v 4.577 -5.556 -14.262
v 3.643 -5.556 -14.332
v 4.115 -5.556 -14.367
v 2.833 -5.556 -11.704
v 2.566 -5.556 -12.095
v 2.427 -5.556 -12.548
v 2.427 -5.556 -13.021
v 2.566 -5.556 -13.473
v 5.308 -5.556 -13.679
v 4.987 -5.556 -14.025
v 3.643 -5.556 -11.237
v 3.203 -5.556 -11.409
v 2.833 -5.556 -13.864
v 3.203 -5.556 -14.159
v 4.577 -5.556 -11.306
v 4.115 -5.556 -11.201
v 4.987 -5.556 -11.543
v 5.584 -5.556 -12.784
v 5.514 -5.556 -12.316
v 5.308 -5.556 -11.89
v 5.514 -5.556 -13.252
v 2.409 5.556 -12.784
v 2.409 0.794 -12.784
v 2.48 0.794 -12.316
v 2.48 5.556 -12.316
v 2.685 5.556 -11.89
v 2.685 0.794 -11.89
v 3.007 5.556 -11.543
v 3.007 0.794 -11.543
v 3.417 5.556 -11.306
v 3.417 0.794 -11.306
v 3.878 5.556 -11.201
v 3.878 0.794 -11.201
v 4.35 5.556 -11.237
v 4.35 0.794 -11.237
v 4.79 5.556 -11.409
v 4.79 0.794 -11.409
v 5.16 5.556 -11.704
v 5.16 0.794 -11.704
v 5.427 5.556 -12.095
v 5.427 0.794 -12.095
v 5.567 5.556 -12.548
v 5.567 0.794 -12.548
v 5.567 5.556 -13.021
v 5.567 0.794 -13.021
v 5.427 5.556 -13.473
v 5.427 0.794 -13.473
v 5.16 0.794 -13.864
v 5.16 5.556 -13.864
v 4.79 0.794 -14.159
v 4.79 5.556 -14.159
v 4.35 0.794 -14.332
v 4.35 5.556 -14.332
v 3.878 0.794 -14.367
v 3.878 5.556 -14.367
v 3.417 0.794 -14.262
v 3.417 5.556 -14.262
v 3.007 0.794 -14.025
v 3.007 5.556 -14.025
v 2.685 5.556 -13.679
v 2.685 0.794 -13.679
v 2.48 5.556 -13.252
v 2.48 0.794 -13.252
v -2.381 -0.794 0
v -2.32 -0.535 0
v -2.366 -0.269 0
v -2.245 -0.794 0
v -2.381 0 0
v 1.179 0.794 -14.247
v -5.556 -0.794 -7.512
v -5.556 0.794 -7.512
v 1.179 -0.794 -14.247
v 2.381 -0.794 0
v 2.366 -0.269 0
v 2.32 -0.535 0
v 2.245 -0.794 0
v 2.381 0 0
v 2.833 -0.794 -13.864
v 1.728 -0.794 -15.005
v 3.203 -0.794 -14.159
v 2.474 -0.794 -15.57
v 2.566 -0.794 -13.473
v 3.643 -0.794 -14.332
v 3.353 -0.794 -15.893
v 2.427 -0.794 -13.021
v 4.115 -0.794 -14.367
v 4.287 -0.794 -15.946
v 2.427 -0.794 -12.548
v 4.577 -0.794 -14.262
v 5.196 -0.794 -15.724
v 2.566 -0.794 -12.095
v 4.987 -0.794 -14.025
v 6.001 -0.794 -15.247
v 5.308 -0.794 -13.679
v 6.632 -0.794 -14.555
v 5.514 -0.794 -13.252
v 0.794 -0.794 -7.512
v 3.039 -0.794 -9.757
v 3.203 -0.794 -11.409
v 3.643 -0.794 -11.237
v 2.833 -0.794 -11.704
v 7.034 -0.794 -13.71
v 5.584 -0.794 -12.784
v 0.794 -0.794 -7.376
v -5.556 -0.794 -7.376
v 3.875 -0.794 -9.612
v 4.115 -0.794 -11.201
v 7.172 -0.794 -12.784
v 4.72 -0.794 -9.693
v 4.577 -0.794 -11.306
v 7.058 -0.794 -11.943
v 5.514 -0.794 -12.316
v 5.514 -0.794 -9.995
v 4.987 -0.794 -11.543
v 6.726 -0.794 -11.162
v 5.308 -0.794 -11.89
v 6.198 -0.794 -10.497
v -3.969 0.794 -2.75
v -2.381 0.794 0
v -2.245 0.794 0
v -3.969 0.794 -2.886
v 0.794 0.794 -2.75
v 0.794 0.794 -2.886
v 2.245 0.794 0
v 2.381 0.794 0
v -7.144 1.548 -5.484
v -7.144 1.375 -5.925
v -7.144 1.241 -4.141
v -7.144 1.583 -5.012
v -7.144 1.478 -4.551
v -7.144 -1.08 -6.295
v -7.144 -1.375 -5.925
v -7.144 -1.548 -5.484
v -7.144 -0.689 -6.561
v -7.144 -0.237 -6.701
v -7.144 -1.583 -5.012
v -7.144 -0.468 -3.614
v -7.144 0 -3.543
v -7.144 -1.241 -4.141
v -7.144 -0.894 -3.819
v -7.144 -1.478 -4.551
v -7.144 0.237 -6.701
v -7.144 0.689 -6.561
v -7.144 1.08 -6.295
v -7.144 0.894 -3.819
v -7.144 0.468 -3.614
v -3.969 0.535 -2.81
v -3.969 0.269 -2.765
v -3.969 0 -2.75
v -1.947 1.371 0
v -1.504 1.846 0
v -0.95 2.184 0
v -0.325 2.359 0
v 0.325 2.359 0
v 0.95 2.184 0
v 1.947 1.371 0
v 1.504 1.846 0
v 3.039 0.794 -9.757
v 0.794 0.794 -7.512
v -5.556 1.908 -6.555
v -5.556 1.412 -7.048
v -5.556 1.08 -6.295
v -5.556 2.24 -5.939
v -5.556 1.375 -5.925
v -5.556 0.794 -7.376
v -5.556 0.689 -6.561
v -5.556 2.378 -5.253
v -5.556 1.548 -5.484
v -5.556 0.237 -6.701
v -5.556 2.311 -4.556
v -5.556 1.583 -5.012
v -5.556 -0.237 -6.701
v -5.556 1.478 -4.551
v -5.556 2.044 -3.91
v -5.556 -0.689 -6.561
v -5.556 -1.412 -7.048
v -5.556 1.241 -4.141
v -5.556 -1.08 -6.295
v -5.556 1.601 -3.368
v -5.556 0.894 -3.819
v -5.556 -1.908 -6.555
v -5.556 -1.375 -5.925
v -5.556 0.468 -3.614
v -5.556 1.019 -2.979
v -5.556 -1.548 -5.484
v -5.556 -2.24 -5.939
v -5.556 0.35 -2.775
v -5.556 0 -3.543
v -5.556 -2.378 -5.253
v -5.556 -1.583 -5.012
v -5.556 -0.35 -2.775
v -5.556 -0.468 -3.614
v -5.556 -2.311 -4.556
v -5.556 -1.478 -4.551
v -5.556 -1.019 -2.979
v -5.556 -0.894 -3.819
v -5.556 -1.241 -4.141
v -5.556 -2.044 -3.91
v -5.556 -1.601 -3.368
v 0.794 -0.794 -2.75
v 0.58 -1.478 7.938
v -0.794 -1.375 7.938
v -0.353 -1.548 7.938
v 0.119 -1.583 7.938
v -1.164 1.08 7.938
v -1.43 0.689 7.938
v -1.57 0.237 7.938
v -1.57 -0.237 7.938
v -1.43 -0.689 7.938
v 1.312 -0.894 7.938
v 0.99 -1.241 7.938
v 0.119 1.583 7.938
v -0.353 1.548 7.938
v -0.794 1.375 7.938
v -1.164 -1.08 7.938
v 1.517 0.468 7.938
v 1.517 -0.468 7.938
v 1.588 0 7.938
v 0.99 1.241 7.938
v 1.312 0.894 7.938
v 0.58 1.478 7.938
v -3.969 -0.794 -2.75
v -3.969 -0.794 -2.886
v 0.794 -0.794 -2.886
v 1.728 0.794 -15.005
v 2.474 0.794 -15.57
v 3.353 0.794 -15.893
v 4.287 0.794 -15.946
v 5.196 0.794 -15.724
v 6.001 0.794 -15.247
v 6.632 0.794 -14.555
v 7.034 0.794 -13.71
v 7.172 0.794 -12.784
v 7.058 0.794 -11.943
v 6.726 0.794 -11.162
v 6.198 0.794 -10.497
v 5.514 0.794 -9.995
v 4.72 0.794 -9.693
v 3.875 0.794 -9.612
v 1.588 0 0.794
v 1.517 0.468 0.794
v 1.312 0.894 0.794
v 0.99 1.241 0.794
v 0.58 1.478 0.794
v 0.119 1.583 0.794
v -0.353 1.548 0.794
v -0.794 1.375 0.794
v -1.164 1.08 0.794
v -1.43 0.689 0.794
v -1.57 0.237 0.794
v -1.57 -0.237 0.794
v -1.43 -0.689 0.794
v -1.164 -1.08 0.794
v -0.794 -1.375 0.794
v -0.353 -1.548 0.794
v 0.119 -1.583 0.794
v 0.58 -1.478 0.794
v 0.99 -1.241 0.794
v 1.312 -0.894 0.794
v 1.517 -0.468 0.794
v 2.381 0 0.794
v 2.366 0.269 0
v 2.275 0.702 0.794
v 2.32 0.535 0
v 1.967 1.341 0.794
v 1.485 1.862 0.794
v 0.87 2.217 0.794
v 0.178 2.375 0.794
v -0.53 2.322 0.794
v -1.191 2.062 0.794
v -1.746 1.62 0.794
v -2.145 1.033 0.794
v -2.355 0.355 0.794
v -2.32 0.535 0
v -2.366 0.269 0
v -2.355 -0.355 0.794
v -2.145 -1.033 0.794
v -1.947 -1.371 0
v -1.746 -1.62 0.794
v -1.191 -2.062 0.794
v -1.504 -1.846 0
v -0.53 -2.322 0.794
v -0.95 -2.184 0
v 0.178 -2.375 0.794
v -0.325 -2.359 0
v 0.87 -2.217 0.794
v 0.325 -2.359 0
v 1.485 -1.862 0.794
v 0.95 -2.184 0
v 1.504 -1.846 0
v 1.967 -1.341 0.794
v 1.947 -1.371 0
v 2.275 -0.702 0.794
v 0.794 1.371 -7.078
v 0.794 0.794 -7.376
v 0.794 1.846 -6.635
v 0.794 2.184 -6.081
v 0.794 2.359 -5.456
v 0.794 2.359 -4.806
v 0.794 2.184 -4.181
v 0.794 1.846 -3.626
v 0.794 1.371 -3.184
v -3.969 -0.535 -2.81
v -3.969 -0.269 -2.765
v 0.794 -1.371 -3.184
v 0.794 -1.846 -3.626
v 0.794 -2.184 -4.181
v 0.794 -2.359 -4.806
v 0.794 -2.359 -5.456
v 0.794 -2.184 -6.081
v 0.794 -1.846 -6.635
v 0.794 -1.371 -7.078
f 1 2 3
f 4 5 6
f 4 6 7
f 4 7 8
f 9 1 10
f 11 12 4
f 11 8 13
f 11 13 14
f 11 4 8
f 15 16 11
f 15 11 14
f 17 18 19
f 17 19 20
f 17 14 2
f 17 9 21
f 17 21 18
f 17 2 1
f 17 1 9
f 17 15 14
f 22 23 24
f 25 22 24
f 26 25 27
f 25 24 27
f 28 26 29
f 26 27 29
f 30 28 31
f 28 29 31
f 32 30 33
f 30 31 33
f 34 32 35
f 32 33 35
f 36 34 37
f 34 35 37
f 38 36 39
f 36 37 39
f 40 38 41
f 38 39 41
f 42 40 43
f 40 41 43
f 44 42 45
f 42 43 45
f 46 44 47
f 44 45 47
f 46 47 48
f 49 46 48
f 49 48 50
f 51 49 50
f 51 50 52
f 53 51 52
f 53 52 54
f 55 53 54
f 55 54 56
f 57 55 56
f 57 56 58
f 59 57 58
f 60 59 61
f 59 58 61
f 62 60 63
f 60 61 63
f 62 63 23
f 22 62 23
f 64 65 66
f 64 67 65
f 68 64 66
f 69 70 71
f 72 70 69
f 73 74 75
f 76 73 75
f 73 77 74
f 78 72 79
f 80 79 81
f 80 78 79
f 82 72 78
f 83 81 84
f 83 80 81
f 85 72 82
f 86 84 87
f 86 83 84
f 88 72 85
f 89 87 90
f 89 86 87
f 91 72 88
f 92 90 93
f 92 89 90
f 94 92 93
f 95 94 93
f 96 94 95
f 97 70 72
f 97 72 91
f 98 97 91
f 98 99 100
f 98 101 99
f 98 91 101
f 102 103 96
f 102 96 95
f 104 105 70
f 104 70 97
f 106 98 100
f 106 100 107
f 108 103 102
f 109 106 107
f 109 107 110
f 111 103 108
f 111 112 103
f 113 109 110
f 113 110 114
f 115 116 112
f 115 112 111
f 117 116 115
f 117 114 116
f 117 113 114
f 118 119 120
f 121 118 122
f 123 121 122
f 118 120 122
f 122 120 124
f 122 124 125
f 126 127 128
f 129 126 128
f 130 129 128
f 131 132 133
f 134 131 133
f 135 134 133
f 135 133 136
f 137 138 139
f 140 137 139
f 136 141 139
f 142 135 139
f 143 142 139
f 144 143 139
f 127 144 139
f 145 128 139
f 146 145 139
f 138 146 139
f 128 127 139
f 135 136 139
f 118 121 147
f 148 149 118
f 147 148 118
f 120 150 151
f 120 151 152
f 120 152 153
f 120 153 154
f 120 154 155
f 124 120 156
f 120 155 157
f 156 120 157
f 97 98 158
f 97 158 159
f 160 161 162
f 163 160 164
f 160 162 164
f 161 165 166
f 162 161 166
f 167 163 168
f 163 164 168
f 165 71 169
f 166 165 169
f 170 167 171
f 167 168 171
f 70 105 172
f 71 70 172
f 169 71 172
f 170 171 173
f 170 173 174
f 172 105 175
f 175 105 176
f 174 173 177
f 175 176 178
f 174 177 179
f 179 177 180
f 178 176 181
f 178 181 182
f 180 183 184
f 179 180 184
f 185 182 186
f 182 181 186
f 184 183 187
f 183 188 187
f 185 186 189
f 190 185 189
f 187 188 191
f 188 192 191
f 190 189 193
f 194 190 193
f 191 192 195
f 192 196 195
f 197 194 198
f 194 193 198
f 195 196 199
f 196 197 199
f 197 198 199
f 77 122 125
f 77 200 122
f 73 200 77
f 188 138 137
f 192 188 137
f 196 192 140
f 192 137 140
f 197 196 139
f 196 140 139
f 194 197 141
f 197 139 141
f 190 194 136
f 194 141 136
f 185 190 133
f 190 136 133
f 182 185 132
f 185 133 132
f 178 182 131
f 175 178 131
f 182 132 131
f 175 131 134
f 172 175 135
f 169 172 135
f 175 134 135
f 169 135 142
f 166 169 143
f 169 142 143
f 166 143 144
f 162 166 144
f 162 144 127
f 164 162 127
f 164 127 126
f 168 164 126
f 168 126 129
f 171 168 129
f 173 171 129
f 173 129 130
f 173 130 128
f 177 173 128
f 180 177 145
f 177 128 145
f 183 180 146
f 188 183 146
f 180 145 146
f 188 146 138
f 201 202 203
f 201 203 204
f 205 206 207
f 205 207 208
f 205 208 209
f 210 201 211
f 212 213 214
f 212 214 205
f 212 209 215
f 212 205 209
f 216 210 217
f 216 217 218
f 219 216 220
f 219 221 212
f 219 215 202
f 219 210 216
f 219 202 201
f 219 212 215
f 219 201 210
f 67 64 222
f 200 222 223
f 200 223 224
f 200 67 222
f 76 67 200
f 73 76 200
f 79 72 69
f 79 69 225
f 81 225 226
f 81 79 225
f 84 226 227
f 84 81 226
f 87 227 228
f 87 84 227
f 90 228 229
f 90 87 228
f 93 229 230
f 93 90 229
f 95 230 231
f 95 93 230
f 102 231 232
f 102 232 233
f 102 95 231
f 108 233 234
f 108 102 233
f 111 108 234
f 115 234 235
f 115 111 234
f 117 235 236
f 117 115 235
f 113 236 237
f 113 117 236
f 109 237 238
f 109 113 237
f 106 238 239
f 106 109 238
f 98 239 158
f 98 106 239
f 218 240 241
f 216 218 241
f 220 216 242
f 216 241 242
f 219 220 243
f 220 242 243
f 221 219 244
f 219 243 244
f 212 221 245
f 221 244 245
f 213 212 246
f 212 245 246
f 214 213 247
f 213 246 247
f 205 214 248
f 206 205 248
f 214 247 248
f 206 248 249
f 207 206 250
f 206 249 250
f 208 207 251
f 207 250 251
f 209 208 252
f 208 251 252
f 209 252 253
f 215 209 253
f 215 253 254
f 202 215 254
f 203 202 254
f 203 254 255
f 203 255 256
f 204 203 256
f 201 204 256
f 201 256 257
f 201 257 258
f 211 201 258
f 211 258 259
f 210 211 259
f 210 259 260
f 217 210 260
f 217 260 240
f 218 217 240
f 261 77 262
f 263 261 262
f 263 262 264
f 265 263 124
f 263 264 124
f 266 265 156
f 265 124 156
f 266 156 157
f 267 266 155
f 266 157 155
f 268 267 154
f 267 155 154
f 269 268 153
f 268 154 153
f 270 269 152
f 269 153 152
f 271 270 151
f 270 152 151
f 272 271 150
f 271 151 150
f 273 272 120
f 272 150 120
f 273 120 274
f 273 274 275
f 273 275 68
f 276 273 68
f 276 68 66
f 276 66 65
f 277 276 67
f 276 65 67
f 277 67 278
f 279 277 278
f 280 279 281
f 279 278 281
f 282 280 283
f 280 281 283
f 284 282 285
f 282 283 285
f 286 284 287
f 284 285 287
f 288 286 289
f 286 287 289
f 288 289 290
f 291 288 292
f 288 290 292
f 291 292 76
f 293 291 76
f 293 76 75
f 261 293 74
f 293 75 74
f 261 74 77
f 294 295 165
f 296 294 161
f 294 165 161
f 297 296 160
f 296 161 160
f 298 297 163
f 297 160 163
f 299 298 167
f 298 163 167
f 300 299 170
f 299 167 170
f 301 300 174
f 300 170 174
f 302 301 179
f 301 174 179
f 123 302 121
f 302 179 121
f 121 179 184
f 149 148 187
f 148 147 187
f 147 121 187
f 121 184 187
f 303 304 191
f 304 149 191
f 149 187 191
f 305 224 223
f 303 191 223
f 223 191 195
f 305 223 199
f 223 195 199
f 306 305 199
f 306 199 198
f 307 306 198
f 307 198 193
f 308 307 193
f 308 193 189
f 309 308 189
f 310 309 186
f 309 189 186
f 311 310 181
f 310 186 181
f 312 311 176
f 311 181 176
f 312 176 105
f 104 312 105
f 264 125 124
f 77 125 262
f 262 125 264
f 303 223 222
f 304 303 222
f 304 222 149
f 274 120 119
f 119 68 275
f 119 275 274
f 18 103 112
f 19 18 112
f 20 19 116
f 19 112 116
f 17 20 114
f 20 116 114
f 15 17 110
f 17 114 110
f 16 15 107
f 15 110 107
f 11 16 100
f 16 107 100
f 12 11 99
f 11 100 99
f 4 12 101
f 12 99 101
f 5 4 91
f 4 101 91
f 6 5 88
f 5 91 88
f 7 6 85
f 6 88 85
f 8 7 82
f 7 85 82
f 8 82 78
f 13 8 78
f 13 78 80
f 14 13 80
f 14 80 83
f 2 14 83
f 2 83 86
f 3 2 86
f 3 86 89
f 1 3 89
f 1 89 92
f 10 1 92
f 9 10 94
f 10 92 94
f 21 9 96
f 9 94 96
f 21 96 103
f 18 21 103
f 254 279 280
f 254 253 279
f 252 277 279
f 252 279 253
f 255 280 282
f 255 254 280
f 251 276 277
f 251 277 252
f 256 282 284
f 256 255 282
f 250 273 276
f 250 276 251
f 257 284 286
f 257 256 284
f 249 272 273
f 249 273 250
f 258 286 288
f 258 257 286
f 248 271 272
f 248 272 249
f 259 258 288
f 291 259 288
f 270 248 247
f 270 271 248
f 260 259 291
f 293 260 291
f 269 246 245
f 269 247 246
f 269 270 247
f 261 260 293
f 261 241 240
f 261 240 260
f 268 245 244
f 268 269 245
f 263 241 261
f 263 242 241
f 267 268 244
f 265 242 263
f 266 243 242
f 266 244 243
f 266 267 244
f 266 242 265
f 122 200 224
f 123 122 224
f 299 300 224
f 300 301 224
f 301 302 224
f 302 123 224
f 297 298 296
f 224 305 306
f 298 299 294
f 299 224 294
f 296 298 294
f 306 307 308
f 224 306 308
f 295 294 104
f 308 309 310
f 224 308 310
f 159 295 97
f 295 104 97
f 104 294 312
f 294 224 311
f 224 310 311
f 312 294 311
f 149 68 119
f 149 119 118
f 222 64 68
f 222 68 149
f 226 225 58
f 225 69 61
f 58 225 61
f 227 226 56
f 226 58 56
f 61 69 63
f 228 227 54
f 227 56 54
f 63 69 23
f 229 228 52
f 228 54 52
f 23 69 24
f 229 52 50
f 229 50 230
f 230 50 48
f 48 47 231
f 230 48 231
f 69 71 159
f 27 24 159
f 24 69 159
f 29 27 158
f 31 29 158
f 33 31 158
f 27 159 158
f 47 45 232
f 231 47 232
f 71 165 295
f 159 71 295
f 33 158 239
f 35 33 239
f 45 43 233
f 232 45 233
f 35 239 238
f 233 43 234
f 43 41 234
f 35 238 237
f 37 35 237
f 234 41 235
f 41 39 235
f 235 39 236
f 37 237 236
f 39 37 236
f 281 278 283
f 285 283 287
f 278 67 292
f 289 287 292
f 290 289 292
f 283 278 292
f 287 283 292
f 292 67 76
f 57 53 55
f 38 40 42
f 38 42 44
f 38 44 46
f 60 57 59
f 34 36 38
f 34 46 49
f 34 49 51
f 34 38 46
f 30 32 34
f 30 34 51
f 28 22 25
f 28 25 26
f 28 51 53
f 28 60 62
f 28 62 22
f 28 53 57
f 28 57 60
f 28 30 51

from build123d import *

# Parameters (mm, degrees)
F0_R     = 2.38125
F0_R_2   = 1.5875
F1_DEPTH = 0.79375
F2_DEPTH = 7.9375
F3_W     = 4.7625
F3_H     = 0.79375
F4_DEPTH = 0.79375
F3_W_2   = 6.35
F6_R     = 1.5875
F7_DEPTH = 4.7625
F8_R     = 1.5875
F9_DEPTH = 4.7625


with BuildPart() as f1:
    # F0 (on Top) → F1 (new body)
    with BuildSketch(Plane.XY):
        Circle(F0_R)
        Circle(F0_R_2, mode=Mode.SUBTRACT)
    extrude(amount=F1_DEPTH)

    # F0 (on Top) → F2 (join)
    with BuildSketch(Plane.XY):
        Circle(F0_R_2)
    extrude(amount=F2_DEPTH)

    # F3 (on Front) → F4 (join, symmetric)
    with BuildSketch(Plane.XZ):
        Polygon((2.38125, 0), (0, 0), (-2.38125, 0), (-3.96875, -2.749630657), (0.79375, -2.749630657), align=None)
        with Locations((-1.5875, -3.146505657)):
            Rectangle(F3_W, F3_H)
    extrude(amount=F4_DEPTH, both=True)



with BuildPart() as f4:
    # F3 (on Front) → F4, piece 2 (new body, symmetric)
    with BuildSketch(Plane.XZ):
        with Locations((-2.38125, -7.115255657)):
            Rectangle(F3_W_2, F3_H)
        with BuildLine():
            Line((3.0388140303, -9.7571946873), (0.79375, -7.512130657))
            Line((0.79375, -7.512130657), (-5.55625, -7.512130657))
            Line((-5.55625, -7.512130657), (1.1789420908, -14.2473227478))
            ThreePointArc((1.1789420908, -14.2473227478), (1.0634268399, -11.5692186432), (3.0388140303, -9.7571946873))
        make_face()
        with BuildLine():
            Line((1.1789420908, -14.2473227478), (3.0388140303, -9.7571946873))
            ThreePointArc((3.0388140303, -9.7571946873), (1.0634268399, -11.5692186432), (1.1789420908, -14.2473227478))
        make_face()
        with BuildLine():
            ThreePointArc((7.1717443556, -12.7842385409), (5.872803552, -10.2227883869), (3.0388140303, -9.7571946873))
            Line((3.0388140303, -9.7571946873), (1.1789420908, -14.2473227478))
            ThreePointArc((1.1789420908, -14.2473227478), (4.7497725122, -15.8686466844), (7.1717443556, -12.7842385409))
        make_face()
    extrude(amount=F4_DEPTH, both=True)


with BuildPart() as f1_1:
    add(f1.part)

    add(f4.part)  # F5 merges F4
    # F3 (on Front) → F5 (revolve)
    with BuildSketch(Plane.XZ):
        Polygon((-3.96875, -3.543380657), (-3.96875, -2.749630657), (-5.55625, -2.749630657), (-5.55625, -3.543380657), (-7.14375, -3.543380657), (-7.14375, -5.130880657), (-5.55625, -5.130880657), (0.79375, -5.130880657), (0.79375, -3.543380657), align=None)
        with Locations((-1.5875, -3.146505657)):
            Rectangle(F3_W, F3_H)
    revolve(axis=Axis((-2.38125, 0, -5.130880657), (1, 0, 0)))

    # F6 (on face) → F7 (join)
    with BuildSketch(Plane.XZ.offset(0.79375)):
        with Locations((3.9967443556, -12.7842385409)):
            Circle(F6_R)
    extrude(amount=F7_DEPTH)

    # F8 (on face) → F9 (join)
    with BuildSketch(Plane(origin=(0, 0.79375, 0), x_dir=(-1, 0, 0), z_dir=(0, 1, 0))):
        with Locations((-3.9967443556, -12.7842385409)):
            Circle(F8_R)
    extrude(amount=F9_DEPTH)


solid = f1_1.part
